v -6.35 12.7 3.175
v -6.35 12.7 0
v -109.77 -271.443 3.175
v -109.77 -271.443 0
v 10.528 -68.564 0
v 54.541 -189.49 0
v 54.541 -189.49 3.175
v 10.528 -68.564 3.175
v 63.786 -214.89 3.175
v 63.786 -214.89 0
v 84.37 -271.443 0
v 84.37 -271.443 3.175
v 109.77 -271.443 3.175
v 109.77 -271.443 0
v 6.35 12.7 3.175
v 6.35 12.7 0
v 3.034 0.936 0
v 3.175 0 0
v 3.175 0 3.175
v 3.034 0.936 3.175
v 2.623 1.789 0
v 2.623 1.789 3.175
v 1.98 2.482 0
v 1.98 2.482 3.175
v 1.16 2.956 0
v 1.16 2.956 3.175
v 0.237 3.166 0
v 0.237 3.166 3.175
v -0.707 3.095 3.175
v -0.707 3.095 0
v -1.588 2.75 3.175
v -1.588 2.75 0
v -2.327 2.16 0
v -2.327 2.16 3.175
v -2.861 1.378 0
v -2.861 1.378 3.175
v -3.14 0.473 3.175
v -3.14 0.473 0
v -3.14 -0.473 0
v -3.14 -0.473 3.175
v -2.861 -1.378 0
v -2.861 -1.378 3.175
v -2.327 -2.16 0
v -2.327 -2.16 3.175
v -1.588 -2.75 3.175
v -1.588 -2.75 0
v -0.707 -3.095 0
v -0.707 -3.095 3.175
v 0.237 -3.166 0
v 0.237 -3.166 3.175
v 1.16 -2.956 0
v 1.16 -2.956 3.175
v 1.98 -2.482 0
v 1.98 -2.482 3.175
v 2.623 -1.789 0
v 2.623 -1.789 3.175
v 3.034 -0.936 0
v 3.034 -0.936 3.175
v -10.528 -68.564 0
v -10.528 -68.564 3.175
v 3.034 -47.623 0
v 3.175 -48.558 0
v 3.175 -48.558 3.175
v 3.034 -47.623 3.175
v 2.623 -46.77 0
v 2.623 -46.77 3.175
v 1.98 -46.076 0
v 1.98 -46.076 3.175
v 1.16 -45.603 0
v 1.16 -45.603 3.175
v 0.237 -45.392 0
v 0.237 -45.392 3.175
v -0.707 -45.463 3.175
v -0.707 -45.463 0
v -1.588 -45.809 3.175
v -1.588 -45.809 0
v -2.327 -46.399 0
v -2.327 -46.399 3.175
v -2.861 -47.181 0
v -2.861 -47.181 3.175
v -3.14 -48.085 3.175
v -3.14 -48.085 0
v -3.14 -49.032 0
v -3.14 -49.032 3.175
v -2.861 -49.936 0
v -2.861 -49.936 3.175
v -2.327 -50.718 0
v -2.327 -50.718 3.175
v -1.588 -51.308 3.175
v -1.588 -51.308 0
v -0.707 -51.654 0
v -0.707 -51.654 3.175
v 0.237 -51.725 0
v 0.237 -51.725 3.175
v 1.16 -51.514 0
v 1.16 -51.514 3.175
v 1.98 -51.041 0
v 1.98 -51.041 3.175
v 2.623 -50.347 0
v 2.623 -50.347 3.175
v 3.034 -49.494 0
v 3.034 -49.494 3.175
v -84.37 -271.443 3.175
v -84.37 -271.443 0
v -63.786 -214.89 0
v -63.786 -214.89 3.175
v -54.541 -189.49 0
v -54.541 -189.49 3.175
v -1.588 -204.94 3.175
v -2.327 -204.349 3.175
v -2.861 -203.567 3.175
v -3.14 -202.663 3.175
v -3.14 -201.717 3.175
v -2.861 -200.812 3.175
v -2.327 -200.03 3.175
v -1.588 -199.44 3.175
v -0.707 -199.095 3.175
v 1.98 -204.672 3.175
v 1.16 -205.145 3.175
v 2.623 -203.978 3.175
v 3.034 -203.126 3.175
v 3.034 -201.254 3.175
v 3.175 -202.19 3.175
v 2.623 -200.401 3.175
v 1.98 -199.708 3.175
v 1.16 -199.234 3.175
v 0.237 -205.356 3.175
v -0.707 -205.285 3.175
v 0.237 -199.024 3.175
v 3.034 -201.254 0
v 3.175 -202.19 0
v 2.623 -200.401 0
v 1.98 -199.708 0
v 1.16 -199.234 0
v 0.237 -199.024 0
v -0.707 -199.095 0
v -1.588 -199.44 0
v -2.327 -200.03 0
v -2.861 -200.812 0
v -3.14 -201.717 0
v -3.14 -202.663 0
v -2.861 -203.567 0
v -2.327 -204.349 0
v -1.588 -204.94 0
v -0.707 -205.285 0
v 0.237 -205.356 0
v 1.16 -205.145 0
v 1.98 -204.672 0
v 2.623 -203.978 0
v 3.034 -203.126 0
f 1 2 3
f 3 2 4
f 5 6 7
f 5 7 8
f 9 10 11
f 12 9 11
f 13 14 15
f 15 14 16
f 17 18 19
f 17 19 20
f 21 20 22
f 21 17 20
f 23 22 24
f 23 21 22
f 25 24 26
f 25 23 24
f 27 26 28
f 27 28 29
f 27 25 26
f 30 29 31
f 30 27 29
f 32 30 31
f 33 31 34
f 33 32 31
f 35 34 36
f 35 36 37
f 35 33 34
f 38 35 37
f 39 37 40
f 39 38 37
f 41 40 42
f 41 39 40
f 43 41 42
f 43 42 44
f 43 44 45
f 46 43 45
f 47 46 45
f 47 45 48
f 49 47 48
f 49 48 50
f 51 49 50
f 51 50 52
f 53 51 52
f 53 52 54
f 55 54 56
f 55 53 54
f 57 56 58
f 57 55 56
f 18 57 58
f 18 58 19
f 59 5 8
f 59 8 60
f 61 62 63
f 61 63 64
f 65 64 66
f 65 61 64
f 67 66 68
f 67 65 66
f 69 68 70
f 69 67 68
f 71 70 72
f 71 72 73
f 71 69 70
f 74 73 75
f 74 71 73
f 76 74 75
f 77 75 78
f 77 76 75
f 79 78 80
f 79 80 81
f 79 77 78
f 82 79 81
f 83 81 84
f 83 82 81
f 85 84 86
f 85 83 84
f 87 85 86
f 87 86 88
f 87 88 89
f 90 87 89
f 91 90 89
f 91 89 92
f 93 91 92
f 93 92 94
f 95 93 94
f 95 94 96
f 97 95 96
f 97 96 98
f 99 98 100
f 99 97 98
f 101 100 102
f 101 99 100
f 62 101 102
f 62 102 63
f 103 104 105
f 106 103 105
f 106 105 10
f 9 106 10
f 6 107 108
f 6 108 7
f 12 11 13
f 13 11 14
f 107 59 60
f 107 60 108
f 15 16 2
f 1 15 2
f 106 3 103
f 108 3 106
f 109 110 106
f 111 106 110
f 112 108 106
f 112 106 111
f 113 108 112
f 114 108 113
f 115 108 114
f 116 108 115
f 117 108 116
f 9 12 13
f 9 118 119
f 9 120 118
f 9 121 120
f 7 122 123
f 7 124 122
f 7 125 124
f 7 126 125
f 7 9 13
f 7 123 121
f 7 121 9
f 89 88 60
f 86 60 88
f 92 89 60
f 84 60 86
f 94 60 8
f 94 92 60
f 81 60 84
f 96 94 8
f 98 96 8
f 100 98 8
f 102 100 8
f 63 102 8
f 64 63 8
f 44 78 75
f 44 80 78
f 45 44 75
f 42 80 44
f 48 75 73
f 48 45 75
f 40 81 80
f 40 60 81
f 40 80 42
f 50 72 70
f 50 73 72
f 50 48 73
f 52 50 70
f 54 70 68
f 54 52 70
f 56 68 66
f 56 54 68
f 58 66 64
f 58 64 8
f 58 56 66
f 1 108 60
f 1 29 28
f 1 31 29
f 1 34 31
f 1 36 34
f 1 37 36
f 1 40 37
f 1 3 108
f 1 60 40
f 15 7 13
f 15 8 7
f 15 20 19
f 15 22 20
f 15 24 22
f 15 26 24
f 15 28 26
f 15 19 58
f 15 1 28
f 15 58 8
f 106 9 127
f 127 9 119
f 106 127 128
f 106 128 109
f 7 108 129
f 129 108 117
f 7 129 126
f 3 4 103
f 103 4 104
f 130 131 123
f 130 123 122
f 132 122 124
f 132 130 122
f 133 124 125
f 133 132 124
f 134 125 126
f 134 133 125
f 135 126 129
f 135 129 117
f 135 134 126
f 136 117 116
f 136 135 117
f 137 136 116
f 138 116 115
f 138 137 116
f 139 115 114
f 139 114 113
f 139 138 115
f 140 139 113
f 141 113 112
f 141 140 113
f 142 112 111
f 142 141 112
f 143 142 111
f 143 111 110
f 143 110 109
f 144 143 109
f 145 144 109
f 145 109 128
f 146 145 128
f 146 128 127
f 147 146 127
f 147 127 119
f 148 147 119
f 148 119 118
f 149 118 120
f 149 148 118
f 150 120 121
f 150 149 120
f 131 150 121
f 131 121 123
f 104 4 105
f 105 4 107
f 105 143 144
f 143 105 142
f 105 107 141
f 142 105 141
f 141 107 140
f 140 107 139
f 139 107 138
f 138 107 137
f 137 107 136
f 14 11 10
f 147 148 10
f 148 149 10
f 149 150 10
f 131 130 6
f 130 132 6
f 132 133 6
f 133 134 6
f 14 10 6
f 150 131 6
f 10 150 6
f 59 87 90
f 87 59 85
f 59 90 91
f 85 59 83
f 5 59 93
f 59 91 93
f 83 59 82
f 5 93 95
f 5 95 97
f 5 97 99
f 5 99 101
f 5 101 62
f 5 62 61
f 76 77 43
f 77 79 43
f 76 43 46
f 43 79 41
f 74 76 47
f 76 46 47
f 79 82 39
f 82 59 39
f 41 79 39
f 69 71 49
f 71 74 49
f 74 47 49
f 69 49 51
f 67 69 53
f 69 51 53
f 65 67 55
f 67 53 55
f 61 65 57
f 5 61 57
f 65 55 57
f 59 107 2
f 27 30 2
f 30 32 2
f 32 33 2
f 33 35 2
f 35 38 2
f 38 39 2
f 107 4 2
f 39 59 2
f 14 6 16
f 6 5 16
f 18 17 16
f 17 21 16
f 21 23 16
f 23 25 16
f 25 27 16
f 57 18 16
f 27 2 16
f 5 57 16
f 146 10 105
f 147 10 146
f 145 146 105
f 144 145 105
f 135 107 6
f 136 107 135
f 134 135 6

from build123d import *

# Parameters (mm, degrees)
SKETCH1_R           = 3.175
BOSS_EXTRUDE1_DEPTH = 3.175


with BuildPart() as part:
    # Sketch1 → Boss-Extrude1 (new body)
    with BuildSketch(Plane.XY):
        Polygon((6.35, 12.7), (-6.35, 12.7), (-109.769758062, -271.44345), (-84.369758062, -271.44345), (-63.785953331, -214.889911296), (63.785953331, -214.889911296), (84.369758062, -271.44345), (109.769758062, -271.44345), align=None)
        Circle(SKETCH1_R, mode=Mode.SUBTRACT)
        with Locations((0, -48.55845)):
            Circle(SKETCH1_R, mode=Mode.SUBTRACT)
        with Locations((0, -202.189911296)):
            Circle(SKETCH1_R, mode=Mode.SUBTRACT)
        Polygon((54.541109381, -189.489911296), (10.527609118, -68.563813172), (-10.527609118, -68.563813172), (-54.541109381, -189.489911296), align=None, mode=Mode.SUBTRACT)
    extrude(amount=BOSS_EXTRUDE1_DEPTH)


solid = part.part
